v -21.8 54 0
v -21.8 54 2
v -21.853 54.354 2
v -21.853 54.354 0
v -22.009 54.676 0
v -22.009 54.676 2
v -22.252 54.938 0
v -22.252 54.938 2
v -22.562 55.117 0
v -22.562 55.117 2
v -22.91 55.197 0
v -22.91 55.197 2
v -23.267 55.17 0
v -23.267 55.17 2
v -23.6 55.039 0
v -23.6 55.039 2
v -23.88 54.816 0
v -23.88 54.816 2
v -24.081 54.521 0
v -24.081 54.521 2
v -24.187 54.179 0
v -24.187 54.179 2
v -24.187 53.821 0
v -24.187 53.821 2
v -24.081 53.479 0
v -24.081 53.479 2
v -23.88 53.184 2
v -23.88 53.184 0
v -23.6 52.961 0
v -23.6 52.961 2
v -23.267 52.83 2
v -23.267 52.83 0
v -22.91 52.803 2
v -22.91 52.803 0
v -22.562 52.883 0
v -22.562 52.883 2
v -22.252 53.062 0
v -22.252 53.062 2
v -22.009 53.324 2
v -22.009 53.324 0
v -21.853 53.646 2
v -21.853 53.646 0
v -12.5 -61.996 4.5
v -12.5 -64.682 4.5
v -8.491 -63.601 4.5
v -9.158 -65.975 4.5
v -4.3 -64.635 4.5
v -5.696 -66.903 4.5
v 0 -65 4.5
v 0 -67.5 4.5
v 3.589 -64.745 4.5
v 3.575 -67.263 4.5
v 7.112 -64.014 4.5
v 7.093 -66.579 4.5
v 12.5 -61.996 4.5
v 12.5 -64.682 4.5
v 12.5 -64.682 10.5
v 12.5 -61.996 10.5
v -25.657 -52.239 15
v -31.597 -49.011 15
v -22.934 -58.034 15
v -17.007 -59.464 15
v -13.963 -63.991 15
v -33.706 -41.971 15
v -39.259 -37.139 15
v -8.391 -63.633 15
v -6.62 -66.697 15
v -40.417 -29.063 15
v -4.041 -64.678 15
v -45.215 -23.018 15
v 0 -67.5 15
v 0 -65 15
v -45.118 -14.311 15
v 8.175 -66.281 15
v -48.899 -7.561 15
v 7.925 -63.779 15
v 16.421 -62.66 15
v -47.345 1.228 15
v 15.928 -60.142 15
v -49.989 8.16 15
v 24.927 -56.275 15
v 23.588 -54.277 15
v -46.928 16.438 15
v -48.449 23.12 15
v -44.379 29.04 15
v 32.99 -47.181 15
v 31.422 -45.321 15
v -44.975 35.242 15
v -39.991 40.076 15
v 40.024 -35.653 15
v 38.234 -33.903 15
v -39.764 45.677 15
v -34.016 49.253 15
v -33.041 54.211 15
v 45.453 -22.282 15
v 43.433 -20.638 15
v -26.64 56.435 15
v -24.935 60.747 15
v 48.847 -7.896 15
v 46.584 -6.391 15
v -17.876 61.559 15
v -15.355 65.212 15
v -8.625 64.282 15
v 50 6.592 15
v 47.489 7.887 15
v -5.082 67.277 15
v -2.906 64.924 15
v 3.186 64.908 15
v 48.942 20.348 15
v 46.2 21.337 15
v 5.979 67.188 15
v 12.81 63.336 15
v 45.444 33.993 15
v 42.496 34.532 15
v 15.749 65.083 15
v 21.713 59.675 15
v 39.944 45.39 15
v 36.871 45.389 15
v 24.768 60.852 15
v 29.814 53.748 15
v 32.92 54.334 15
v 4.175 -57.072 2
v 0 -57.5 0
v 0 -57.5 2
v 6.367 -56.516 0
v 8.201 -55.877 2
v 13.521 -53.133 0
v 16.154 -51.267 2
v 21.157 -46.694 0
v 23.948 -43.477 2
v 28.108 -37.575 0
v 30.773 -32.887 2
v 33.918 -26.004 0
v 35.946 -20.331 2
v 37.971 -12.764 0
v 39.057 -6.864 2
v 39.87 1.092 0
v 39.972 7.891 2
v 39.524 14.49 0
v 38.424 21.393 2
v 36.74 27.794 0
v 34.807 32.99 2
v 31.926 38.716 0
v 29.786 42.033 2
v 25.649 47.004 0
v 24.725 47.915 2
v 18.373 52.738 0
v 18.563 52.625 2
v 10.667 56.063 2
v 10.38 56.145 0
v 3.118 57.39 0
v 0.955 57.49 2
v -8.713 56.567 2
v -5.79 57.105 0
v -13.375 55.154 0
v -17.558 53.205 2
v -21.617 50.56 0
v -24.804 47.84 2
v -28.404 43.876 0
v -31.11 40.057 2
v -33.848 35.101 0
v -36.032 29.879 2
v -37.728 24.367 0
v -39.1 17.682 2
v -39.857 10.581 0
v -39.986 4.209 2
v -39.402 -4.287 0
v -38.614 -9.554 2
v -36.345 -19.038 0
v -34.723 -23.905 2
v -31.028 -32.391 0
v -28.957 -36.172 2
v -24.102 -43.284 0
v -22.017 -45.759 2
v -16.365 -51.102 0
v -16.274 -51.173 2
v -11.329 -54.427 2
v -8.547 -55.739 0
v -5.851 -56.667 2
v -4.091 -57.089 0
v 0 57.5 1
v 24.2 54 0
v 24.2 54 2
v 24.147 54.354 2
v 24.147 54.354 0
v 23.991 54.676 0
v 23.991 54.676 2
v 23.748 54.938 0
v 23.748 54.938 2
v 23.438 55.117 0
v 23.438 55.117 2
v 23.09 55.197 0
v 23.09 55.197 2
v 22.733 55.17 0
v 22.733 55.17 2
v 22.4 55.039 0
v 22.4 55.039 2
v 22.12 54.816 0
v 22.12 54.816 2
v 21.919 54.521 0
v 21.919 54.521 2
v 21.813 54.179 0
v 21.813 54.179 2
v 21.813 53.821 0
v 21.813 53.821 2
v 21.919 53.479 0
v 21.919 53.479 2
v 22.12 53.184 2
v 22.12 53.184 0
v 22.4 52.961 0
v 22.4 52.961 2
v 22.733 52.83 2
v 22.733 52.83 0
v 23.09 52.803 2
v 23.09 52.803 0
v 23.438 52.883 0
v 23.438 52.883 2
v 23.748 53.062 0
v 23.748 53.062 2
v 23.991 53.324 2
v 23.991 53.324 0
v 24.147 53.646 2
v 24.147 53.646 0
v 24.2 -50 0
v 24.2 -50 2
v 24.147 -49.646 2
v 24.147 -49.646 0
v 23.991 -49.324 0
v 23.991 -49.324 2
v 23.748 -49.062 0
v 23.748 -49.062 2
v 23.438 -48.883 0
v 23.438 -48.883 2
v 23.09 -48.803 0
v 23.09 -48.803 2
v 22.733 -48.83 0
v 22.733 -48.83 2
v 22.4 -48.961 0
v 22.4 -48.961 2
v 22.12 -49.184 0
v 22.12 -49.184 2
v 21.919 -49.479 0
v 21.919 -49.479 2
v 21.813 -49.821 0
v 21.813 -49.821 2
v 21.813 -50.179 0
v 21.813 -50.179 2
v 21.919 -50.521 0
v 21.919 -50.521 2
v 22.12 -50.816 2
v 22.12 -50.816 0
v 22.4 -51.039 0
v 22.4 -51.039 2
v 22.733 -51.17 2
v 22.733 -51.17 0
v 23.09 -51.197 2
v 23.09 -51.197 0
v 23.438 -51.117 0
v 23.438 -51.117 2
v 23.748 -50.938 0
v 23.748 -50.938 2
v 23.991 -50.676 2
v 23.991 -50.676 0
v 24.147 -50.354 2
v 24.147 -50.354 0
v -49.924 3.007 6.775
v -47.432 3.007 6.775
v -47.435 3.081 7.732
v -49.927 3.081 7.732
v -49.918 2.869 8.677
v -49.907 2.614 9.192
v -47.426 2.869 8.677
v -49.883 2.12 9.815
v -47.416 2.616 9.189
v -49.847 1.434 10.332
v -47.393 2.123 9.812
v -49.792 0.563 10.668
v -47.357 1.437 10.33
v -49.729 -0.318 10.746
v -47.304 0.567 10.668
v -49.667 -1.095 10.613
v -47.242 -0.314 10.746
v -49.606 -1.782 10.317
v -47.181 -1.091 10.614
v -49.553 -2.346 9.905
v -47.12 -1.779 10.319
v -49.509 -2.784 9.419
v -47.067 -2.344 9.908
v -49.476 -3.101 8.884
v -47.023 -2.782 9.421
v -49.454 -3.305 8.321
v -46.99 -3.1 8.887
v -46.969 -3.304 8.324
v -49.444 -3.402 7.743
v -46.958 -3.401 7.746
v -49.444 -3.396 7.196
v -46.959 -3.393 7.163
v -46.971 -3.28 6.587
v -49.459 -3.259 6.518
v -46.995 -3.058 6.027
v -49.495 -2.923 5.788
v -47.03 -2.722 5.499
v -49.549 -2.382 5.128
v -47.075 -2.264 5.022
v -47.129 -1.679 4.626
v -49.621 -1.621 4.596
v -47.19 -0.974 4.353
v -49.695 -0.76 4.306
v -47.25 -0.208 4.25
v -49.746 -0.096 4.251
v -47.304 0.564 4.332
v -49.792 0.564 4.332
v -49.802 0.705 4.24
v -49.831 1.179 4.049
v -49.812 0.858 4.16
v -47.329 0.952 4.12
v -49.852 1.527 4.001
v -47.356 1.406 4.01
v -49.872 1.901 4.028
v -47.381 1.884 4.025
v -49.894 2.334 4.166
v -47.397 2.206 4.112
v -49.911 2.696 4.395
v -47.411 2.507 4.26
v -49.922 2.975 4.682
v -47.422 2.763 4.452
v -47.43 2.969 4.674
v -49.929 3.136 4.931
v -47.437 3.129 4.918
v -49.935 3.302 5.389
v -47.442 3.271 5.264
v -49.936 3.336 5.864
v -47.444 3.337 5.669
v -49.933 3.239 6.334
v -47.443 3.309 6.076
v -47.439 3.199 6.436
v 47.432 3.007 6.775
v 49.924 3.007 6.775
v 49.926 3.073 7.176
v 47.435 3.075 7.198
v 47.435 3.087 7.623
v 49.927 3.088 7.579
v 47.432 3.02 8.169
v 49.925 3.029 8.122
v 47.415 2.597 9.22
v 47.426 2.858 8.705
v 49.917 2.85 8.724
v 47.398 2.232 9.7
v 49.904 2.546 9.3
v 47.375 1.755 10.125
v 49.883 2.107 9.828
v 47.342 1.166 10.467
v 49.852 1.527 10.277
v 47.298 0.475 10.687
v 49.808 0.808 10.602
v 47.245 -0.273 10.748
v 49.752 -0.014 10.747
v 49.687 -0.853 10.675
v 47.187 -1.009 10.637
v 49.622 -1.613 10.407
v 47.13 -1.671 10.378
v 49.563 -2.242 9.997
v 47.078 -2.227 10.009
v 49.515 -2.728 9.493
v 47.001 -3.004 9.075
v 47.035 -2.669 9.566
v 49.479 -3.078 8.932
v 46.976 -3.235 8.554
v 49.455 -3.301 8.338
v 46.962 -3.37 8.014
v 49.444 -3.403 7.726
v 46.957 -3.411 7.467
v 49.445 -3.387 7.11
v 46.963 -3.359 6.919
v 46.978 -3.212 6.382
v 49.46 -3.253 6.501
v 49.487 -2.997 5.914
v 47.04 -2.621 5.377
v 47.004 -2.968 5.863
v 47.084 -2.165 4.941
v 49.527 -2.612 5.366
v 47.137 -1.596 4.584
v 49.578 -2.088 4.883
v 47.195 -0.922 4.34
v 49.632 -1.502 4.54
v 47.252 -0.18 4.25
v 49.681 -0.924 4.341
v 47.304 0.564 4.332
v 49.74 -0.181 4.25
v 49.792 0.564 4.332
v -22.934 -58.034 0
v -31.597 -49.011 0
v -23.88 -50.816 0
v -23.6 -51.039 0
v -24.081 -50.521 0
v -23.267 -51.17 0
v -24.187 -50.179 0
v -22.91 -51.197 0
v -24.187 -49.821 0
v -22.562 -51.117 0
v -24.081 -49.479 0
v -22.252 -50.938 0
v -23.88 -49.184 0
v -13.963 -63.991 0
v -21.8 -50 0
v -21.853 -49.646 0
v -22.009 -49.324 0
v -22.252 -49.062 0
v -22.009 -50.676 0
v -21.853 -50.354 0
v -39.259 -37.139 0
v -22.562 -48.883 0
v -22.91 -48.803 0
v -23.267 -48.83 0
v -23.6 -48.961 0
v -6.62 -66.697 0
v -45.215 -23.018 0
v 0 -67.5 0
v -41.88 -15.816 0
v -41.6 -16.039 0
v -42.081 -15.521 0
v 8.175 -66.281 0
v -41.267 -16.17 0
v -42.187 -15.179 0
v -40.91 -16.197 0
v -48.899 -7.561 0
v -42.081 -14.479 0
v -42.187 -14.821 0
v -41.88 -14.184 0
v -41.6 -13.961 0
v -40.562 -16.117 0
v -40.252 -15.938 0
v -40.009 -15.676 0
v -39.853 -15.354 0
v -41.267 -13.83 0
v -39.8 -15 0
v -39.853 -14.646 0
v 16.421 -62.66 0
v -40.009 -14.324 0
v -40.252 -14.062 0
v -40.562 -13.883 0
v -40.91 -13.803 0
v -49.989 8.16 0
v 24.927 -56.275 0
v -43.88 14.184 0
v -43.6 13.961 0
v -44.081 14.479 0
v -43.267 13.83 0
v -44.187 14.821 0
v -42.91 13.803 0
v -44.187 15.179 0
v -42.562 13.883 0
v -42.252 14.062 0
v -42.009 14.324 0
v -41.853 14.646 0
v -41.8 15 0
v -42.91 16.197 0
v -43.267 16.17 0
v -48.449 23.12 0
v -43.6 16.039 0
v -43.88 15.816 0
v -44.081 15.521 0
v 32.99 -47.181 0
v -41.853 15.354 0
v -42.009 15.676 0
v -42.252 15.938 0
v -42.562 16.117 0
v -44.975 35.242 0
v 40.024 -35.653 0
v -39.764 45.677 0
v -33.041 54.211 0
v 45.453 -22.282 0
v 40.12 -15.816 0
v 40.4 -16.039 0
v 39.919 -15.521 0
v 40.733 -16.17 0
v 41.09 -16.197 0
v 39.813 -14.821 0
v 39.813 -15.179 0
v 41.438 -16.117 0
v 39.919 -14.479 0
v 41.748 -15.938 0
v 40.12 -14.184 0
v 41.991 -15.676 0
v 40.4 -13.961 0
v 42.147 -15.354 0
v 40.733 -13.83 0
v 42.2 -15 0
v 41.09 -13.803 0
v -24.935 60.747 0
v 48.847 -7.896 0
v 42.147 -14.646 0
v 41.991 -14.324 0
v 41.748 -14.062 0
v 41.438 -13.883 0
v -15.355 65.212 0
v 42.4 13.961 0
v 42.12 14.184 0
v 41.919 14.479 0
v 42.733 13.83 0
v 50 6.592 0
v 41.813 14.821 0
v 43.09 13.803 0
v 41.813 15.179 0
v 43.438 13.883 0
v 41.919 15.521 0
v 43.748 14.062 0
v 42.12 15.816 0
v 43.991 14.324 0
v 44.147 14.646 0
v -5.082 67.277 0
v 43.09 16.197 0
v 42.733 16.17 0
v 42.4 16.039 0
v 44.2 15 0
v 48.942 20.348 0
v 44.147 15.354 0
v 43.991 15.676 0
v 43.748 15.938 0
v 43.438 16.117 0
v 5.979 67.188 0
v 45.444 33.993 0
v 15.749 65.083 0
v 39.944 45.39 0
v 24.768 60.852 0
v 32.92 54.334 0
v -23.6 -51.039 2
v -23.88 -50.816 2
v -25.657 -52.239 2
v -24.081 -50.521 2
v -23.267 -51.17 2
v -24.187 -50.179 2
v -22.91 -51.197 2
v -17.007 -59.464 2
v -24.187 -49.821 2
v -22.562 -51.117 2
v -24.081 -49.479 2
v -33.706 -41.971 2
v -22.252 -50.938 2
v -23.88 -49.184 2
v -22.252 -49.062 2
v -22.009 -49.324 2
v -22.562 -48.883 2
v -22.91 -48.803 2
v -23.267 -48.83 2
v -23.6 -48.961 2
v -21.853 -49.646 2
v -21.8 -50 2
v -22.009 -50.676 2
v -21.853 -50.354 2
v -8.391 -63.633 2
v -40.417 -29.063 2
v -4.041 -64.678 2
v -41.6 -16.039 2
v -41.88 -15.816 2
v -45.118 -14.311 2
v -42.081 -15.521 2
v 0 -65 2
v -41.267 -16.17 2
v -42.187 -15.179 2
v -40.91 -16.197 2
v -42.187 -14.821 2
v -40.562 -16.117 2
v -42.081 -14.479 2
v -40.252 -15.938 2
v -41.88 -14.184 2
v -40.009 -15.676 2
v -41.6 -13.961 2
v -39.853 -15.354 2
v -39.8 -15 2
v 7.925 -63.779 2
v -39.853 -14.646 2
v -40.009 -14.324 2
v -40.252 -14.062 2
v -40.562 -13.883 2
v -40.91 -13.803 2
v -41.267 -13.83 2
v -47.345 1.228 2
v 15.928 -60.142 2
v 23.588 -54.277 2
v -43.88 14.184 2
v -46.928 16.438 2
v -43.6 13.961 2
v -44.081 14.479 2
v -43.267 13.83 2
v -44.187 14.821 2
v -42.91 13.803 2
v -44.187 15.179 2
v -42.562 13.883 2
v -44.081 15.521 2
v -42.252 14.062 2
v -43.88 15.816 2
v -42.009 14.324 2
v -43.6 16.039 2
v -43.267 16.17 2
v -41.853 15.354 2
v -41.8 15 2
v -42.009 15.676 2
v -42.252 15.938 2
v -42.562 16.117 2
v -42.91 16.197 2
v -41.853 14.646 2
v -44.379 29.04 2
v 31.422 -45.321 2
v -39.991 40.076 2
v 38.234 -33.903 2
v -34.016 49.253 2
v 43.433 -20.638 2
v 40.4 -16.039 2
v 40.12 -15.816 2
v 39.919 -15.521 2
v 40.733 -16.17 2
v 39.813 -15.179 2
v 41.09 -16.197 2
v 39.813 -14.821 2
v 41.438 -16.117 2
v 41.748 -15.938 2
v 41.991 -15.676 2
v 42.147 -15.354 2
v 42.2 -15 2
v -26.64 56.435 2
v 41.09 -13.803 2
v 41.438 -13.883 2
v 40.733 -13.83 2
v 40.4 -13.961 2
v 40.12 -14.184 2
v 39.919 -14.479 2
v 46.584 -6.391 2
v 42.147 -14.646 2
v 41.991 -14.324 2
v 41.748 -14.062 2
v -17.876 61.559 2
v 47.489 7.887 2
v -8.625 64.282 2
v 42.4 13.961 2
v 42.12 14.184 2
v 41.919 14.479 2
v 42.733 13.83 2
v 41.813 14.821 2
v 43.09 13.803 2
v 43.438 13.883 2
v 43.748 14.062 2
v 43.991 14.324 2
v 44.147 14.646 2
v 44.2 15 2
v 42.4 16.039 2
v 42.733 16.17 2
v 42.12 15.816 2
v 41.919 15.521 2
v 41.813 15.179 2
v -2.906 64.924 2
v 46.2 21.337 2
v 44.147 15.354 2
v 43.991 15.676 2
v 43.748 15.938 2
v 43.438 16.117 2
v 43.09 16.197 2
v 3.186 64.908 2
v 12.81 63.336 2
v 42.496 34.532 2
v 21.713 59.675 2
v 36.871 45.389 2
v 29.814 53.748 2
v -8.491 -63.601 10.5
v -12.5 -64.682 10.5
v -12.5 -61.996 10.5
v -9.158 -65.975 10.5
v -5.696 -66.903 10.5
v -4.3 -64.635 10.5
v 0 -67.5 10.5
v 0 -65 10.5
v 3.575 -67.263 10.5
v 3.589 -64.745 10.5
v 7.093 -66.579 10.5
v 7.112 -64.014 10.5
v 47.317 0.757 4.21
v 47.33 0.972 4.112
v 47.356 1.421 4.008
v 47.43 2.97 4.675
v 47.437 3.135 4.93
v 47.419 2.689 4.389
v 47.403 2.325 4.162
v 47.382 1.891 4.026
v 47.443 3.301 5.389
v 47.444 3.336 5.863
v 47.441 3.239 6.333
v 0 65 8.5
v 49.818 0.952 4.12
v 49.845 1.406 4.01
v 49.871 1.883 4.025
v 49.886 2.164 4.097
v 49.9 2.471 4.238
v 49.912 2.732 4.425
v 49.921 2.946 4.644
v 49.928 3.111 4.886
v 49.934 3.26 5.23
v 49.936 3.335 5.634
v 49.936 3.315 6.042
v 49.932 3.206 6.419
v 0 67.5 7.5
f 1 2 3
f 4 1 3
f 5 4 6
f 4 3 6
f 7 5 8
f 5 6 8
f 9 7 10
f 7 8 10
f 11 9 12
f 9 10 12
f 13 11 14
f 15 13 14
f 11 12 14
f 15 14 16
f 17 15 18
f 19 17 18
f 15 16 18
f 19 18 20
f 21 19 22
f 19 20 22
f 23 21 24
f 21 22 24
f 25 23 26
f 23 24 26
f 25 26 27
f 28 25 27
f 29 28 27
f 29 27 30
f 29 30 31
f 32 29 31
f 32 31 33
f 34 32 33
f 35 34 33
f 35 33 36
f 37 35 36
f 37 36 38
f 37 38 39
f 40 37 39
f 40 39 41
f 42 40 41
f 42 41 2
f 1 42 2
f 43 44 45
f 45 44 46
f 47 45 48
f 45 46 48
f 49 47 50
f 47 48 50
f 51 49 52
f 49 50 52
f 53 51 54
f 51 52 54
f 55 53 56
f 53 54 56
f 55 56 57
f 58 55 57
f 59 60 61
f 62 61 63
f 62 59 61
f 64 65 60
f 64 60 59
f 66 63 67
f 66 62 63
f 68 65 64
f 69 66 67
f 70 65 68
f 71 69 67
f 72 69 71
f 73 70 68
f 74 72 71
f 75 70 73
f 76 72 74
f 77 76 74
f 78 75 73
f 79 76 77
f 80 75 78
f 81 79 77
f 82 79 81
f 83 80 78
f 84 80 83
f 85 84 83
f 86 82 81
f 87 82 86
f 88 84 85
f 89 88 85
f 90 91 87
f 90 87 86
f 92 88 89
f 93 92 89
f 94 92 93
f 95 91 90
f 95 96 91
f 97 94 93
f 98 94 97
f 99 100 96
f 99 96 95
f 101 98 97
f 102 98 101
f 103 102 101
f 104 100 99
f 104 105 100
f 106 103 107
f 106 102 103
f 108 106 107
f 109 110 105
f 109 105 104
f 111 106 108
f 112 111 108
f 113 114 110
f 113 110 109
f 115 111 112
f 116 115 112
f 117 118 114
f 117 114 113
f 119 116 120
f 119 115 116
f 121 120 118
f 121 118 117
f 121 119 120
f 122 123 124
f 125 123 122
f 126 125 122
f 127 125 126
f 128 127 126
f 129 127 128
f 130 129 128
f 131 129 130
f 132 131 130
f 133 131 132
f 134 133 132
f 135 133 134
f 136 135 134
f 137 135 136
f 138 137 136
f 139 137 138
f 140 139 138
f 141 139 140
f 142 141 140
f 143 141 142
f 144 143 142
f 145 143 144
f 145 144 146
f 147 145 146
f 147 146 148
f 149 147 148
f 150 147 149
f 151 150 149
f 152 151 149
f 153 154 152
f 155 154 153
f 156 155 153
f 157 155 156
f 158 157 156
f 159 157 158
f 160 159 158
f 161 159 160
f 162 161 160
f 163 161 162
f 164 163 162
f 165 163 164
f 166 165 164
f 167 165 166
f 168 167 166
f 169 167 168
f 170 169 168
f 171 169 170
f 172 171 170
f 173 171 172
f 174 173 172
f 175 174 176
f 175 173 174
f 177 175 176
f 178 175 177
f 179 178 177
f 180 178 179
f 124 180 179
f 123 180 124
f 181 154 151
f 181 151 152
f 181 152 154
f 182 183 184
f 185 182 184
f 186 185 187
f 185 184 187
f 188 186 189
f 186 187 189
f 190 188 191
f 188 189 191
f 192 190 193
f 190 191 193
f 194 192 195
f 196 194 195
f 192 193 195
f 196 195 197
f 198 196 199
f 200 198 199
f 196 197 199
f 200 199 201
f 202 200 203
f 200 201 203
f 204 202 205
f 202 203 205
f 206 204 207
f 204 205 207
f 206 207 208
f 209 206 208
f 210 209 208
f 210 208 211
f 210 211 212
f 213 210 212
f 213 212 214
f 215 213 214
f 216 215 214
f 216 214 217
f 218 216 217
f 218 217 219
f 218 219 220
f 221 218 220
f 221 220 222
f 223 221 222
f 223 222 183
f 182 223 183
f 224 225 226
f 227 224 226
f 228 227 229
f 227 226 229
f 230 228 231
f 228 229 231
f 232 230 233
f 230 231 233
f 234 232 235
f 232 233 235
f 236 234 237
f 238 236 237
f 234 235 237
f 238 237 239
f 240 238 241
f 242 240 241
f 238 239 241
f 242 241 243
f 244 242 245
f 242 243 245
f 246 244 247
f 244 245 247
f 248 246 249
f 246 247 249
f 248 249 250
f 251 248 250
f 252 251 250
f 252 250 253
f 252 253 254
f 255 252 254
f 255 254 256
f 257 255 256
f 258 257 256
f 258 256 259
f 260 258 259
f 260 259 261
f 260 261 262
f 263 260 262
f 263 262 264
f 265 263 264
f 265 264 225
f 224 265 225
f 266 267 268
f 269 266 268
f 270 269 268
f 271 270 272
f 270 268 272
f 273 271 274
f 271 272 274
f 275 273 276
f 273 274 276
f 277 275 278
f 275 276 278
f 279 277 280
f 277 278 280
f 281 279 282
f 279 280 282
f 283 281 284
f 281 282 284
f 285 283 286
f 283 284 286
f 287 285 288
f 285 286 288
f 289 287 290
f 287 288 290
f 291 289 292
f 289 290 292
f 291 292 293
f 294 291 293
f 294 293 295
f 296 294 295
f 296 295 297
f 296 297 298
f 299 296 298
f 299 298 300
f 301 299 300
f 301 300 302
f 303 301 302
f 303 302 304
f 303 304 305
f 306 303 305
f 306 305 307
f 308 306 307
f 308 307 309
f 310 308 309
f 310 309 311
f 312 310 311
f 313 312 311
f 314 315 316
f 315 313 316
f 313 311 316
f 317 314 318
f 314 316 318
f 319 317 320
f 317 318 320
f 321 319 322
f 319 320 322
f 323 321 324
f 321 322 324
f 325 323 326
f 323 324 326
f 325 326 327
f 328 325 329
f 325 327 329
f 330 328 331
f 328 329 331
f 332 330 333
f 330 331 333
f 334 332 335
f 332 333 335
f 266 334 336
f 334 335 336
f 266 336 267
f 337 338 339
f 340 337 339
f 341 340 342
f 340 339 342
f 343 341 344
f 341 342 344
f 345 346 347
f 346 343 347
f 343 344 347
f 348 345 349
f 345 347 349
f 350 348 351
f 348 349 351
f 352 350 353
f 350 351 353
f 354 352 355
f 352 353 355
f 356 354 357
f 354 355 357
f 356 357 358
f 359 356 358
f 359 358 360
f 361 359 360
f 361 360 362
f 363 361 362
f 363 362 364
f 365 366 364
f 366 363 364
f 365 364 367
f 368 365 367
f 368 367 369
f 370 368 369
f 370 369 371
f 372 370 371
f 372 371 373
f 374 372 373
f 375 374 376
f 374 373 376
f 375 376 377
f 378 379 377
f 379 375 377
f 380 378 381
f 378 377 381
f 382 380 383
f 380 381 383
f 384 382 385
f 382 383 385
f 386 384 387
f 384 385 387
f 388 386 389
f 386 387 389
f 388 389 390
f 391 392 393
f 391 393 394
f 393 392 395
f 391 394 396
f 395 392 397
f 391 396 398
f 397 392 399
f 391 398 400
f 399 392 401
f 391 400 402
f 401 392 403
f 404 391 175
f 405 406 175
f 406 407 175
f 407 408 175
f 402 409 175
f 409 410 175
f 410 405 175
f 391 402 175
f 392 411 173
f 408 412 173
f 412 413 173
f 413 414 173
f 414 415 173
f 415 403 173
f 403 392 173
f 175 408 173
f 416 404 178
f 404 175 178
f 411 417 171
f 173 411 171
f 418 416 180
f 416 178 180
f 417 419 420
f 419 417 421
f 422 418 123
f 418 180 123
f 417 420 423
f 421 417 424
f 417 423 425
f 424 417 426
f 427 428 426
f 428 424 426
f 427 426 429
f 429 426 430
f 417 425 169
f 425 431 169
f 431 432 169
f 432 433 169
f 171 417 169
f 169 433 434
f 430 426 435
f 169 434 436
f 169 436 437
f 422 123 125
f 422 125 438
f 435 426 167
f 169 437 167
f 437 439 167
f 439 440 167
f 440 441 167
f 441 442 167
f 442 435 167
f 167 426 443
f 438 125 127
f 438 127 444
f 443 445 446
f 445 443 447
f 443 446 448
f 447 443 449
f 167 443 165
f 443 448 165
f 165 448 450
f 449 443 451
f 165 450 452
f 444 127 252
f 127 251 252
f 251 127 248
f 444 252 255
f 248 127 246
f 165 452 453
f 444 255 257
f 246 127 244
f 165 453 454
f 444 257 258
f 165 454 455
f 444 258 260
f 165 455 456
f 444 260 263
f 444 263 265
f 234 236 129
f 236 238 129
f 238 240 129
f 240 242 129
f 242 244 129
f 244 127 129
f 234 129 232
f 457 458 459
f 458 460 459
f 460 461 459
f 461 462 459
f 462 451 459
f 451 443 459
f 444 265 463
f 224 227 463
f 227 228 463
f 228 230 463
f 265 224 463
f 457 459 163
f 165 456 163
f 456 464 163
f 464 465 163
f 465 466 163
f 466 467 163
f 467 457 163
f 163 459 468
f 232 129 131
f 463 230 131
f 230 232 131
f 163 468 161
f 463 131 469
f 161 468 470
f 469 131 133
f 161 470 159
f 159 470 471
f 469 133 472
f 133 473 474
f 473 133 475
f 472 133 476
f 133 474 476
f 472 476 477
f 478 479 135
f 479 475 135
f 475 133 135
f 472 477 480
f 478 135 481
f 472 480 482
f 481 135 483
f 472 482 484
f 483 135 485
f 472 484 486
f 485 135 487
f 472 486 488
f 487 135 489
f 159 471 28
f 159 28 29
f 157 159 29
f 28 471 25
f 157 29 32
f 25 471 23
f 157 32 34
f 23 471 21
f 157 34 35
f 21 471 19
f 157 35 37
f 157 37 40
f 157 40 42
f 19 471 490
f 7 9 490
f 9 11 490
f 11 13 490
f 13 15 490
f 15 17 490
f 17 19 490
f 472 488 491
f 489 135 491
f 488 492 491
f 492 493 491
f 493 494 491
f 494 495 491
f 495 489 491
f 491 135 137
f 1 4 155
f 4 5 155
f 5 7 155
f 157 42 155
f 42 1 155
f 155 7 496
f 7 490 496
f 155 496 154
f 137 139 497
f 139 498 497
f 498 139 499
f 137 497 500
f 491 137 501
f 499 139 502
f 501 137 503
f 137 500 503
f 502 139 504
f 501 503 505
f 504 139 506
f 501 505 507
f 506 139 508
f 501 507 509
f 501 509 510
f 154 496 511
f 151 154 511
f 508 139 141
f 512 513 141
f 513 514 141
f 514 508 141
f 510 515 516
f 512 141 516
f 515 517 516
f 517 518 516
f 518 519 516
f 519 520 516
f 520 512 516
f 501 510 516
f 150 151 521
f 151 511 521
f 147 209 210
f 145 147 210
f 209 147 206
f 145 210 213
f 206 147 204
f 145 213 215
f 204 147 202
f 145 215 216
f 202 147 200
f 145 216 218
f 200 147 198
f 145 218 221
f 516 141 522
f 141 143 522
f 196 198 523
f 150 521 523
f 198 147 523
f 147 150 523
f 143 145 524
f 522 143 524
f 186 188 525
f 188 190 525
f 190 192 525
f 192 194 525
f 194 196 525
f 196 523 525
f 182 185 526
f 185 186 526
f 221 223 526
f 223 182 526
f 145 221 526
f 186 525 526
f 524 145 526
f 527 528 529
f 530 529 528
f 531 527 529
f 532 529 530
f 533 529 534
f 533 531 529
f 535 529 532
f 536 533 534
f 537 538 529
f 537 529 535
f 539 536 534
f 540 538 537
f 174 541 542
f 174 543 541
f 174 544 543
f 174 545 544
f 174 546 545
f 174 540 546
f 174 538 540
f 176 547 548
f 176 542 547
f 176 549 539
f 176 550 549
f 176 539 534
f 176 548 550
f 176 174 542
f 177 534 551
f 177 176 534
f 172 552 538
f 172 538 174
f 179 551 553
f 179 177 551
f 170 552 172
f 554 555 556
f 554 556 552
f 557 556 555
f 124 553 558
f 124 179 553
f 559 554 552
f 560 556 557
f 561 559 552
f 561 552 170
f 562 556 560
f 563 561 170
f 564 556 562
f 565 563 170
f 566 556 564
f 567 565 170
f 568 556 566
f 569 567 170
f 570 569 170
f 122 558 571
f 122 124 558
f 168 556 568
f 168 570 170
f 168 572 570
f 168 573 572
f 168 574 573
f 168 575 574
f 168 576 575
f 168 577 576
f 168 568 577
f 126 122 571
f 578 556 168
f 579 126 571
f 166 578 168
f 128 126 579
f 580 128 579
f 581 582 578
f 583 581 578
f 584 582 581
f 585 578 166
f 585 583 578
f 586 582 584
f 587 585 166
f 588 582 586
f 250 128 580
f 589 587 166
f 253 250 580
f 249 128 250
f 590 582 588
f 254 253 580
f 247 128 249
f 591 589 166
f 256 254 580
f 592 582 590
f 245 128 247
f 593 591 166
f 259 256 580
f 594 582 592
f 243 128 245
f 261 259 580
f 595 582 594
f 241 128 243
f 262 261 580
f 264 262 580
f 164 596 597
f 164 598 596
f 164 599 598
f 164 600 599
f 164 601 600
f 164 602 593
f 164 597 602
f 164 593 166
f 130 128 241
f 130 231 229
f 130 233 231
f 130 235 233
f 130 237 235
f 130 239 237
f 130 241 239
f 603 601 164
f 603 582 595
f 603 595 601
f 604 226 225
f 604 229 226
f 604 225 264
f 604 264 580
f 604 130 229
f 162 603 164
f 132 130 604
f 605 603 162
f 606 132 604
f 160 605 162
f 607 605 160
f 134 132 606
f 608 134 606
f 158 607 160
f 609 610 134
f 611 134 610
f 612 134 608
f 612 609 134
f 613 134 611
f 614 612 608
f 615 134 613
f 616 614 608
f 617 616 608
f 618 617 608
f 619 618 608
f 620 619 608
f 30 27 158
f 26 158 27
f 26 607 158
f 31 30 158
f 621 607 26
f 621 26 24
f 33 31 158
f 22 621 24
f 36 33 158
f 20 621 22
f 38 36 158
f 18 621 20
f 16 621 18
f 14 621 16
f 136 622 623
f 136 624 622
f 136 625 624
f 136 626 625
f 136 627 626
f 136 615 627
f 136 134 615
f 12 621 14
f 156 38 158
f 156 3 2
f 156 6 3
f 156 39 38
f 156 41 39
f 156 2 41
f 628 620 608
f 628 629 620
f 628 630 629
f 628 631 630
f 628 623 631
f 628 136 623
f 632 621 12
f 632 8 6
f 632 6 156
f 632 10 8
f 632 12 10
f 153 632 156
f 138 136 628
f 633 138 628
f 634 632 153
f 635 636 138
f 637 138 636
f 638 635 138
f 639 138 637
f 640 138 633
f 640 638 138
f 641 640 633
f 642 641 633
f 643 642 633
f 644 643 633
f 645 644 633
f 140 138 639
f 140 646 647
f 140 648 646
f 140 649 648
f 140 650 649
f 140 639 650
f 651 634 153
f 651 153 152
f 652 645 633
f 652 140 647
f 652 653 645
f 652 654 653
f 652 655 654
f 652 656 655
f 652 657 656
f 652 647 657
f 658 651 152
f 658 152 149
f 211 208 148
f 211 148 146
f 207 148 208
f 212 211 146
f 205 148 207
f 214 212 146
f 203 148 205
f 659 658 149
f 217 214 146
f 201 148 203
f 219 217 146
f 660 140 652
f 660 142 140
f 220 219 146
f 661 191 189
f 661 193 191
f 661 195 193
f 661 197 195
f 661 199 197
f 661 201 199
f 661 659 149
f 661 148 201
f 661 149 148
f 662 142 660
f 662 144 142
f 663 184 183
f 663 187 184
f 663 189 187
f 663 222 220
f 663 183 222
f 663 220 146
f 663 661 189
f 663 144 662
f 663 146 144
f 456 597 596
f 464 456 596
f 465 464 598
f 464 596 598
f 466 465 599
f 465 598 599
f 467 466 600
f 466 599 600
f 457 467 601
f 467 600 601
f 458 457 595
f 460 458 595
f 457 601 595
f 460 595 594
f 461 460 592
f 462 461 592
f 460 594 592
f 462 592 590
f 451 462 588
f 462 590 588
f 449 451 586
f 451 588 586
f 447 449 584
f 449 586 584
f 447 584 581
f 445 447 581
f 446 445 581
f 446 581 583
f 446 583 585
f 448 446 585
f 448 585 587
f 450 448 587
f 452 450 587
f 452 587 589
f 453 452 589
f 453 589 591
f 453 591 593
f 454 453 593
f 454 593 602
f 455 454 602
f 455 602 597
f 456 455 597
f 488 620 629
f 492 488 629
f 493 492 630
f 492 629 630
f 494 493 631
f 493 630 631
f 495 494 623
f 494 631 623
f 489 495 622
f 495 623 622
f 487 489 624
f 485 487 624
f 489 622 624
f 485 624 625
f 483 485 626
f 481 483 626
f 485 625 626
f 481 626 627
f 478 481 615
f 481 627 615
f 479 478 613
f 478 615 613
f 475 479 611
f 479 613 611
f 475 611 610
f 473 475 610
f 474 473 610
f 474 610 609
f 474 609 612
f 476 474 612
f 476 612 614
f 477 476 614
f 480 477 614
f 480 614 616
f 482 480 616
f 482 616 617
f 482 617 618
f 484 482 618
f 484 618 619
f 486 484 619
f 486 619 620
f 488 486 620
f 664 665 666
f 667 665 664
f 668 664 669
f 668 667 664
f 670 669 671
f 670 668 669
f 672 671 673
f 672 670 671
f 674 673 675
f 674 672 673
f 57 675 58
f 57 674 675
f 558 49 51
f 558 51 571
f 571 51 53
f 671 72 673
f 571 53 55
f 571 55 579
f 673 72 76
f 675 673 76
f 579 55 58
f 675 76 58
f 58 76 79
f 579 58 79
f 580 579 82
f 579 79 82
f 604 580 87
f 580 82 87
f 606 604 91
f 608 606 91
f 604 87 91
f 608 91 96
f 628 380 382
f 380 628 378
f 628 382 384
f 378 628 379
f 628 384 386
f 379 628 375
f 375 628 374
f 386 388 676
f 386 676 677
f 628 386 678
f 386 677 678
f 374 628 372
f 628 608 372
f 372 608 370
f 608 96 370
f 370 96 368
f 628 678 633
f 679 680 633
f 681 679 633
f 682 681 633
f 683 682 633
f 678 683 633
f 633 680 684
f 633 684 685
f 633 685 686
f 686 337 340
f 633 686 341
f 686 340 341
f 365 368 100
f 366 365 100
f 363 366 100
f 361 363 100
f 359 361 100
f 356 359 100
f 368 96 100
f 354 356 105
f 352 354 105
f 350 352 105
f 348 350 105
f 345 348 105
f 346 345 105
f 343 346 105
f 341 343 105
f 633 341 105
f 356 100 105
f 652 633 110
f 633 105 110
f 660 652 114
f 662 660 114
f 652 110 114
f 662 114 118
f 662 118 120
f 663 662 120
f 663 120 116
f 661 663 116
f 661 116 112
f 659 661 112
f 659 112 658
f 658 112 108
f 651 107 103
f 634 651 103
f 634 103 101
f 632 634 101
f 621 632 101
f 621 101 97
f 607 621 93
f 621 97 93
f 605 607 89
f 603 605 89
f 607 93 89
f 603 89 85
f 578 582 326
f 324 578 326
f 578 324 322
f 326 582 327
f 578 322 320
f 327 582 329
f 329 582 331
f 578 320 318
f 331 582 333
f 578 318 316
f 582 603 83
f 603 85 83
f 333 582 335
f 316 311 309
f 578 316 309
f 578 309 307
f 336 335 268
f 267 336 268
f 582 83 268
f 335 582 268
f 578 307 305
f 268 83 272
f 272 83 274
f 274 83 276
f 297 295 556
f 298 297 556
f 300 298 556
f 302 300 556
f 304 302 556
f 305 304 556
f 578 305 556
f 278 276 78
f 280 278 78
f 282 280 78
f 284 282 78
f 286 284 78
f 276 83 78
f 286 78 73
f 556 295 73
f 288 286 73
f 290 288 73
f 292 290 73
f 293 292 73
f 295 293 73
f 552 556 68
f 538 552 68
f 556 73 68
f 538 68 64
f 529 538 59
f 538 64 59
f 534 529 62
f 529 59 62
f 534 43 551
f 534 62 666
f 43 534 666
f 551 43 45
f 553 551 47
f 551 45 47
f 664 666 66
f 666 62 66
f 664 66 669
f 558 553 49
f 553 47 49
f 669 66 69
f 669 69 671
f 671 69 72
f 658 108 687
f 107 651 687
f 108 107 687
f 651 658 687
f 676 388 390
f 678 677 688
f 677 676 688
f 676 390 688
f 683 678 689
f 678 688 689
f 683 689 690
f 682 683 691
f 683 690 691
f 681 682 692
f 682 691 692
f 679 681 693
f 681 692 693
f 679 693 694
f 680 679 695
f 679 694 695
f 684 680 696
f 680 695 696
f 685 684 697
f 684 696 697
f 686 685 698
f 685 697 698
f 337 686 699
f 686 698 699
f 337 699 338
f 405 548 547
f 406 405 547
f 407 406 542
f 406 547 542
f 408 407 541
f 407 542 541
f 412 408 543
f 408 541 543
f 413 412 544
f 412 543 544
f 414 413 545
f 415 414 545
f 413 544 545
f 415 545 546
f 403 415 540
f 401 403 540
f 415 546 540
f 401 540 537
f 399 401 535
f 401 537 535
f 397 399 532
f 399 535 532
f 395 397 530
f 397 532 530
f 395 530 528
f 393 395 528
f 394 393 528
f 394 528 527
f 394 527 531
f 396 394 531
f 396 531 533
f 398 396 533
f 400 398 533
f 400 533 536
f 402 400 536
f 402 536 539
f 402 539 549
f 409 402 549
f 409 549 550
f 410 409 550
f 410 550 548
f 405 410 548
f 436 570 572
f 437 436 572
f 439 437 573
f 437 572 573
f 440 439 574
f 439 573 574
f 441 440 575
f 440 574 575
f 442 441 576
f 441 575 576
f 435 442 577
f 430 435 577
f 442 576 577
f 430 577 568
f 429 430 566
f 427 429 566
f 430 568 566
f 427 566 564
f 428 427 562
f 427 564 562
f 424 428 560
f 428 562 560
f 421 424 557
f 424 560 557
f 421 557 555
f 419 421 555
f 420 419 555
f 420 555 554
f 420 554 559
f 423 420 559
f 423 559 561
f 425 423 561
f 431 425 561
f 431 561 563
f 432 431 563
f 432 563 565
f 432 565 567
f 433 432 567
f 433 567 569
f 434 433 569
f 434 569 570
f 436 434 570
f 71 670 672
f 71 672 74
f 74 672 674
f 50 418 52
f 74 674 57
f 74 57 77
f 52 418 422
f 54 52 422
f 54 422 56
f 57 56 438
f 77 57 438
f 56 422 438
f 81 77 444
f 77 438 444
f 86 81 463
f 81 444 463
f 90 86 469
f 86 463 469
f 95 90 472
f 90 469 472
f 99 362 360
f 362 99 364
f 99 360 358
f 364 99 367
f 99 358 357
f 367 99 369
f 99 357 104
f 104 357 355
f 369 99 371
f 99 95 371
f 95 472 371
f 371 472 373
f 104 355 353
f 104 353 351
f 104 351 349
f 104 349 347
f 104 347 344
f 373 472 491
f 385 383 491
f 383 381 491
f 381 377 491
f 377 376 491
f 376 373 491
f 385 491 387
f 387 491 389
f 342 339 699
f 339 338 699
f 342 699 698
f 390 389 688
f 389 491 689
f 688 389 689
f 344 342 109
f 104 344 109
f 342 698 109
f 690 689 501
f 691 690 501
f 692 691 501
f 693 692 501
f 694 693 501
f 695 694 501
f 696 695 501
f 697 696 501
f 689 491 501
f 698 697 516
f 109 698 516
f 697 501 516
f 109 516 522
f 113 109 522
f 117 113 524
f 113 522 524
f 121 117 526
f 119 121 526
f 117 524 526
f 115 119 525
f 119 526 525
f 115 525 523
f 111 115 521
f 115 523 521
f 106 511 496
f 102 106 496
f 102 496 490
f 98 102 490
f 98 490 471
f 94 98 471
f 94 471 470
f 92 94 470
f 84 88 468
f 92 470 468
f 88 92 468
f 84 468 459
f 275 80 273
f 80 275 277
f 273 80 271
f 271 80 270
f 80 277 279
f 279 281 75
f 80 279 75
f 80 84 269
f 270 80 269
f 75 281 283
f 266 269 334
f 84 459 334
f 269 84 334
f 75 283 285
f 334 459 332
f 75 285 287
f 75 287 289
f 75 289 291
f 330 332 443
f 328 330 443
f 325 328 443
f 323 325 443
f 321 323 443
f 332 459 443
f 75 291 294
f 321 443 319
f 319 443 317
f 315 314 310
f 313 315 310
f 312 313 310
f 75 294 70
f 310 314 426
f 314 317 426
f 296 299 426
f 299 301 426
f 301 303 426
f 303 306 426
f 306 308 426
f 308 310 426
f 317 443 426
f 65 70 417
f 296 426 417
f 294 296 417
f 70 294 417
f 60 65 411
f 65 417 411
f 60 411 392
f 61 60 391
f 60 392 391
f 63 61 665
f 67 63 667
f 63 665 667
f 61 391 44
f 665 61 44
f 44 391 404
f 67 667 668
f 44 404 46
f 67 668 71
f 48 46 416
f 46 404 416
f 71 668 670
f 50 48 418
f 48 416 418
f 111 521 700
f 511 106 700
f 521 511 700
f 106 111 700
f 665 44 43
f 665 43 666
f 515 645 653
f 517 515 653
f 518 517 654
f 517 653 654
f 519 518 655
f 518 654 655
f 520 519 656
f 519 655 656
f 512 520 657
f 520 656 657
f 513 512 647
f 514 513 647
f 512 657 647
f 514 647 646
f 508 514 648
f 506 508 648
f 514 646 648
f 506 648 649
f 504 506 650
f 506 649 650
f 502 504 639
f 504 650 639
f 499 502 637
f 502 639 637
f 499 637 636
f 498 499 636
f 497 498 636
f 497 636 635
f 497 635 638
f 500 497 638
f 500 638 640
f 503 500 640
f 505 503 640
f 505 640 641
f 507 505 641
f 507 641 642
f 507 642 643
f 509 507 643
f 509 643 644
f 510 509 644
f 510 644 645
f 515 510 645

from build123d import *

# Parameters (mm, degrees)
PAD_DEPTH       = 15
POCKET_DEPTH    = 13
SKETCH002_R     = 1.2
HOLE_DEPTH      = 25
SKETCH003_R     = 3.25
SKETCH003_R_2   = 1.75
POCKET001_DEPTH = 103.001035
SKETCH020_W     = 25
SKETCH020_H     = 6
POCKET009_DEPTH = 10


with BuildPart() as part:
    # Sketch → Pad (new body)
    with BuildSketch(Plane.XY):
        with BuildLine():
            add(Edge.make_bspline(
                [(-2.2e-05, -67.5), (33.333311, -67.500011), (74.999989, -20.25), (75.000011, 47.25), (33.333355, 67.499989), (2.2e-05, 67.5), (-33.333311, 67.500011), (-74.999989, 47.25), (-75.000011, -20.25), (-33.333355, -67.499989), (-2.2e-05, -67.5)],
                knots=[0, 0, 0, 0, 0, 0, 1, 1, 1, 1, 1, 2, 2, 2, 2, 2, 2], degree=5, weights=[3, 1.8, 1.2, 1.2, 1.8, 3, 1.8, 1.2, 1.2, 1.8, 3]))
        make_face()
        with BuildLine():
            add(Edge.make_bspline(
                [(-1.9e-05, -57.5), (26.666648, -57.500009), (59.999991, -17.25), (60.000009, 40.25), (26.666685, 57.499991), (1.9e-05, 57.5), (-26.666648, 57.500009), (-59.999991, 40.25), (-60.000009, -17.25), (-26.666685, -57.499991), (-1.9e-05, -57.5)],
                knots=[0, 0, 0, 0, 0, 0, 1, 1, 1, 1, 1, 2, 2, 2, 2, 2, 2], degree=5, weights=[3, 1.8, 1.2, 1.2, 1.8, 3, 1.8, 1.2, 1.2, 1.8, 3]))
        make_face(mode=Mode.SUBTRACT)
    extrude(amount=PAD_DEPTH)

    # Sketch001 (on Face4 of Pad) → Pocket (cut)
    with BuildSketch(Plane.XY.offset(15)):
        with BuildLine():
            add(Edge.make_bspline(
                [(-2.1e-05, -65), (31.666645, -65.00001), (71.249989, -19.5), (71.250011, 45.5), (31.666688, 64.99999), (2.1e-05, 65), (-31.666645, 65.00001), (-71.249989, 45.5), (-71.250011, -19.5), (-31.666688, -64.99999), (-2.1e-05, -65)],
                knots=[0, 0, 0, 0, 0, 0, 1, 1, 1, 1, 1, 2, 2, 2, 2, 2, 2], degree=5, weights=[3, 1.8, 1.2, 1.2, 1.8, 3, 1.8, 1.2, 1.2, 1.8, 3]))
        make_face()
    extrude(amount=-POCKET_DEPTH, mode=Mode.SUBTRACT)

    # Sketch002 (on Face6 of Pocket) → Hole (cut)
    with BuildSketch(Plane.XY.offset(2)):
        with Locations((-41, -15)):
            Circle(SKETCH002_R)
        with Locations((41, -15)):
            Circle(SKETCH002_R)
        with Locations((-23, -50)):
            Circle(SKETCH002_R)
        with Locations((23, -50)):
            Circle(SKETCH002_R)
        with Locations((-43, 15)):
            Circle(SKETCH002_R)
        with Locations((43, 15)):
            Circle(SKETCH002_R)
        with Locations((-23, 54)):
            Circle(SKETCH002_R)
        with Locations((23, 54)):
            Circle(SKETCH002_R)
    extrude(amount=-HOLE_DEPTH, mode=Mode.SUBTRACT)

    # Sketch003 (on DatumPlane) → Pocket001 (cut, through all)
    with BuildSketch(Plane(origin=(52.999999, 1.839221, 7.5), x_dir=(0, 0, -1), z_dir=(1, -1e-06, 0))):
        with Locations((0, -2)):
            Circle(SKETCH003_R)
        with Locations((1.75, -0.25)):
            Circle(SKETCH003_R_2)
    extrude(amount=-POCKET001_DEPTH, mode=Mode.SUBTRACT)

    # Sketch020 → Pocket009 (cut)
    with BuildSketch(Plane.XZ.offset(68)):
        with Locations((0, 7.5)):
            Rectangle(SKETCH020_W, SKETCH020_H)
    extrude(amount=-POCKET009_DEPTH, mode=Mode.SUBTRACT)


solid = part.part
